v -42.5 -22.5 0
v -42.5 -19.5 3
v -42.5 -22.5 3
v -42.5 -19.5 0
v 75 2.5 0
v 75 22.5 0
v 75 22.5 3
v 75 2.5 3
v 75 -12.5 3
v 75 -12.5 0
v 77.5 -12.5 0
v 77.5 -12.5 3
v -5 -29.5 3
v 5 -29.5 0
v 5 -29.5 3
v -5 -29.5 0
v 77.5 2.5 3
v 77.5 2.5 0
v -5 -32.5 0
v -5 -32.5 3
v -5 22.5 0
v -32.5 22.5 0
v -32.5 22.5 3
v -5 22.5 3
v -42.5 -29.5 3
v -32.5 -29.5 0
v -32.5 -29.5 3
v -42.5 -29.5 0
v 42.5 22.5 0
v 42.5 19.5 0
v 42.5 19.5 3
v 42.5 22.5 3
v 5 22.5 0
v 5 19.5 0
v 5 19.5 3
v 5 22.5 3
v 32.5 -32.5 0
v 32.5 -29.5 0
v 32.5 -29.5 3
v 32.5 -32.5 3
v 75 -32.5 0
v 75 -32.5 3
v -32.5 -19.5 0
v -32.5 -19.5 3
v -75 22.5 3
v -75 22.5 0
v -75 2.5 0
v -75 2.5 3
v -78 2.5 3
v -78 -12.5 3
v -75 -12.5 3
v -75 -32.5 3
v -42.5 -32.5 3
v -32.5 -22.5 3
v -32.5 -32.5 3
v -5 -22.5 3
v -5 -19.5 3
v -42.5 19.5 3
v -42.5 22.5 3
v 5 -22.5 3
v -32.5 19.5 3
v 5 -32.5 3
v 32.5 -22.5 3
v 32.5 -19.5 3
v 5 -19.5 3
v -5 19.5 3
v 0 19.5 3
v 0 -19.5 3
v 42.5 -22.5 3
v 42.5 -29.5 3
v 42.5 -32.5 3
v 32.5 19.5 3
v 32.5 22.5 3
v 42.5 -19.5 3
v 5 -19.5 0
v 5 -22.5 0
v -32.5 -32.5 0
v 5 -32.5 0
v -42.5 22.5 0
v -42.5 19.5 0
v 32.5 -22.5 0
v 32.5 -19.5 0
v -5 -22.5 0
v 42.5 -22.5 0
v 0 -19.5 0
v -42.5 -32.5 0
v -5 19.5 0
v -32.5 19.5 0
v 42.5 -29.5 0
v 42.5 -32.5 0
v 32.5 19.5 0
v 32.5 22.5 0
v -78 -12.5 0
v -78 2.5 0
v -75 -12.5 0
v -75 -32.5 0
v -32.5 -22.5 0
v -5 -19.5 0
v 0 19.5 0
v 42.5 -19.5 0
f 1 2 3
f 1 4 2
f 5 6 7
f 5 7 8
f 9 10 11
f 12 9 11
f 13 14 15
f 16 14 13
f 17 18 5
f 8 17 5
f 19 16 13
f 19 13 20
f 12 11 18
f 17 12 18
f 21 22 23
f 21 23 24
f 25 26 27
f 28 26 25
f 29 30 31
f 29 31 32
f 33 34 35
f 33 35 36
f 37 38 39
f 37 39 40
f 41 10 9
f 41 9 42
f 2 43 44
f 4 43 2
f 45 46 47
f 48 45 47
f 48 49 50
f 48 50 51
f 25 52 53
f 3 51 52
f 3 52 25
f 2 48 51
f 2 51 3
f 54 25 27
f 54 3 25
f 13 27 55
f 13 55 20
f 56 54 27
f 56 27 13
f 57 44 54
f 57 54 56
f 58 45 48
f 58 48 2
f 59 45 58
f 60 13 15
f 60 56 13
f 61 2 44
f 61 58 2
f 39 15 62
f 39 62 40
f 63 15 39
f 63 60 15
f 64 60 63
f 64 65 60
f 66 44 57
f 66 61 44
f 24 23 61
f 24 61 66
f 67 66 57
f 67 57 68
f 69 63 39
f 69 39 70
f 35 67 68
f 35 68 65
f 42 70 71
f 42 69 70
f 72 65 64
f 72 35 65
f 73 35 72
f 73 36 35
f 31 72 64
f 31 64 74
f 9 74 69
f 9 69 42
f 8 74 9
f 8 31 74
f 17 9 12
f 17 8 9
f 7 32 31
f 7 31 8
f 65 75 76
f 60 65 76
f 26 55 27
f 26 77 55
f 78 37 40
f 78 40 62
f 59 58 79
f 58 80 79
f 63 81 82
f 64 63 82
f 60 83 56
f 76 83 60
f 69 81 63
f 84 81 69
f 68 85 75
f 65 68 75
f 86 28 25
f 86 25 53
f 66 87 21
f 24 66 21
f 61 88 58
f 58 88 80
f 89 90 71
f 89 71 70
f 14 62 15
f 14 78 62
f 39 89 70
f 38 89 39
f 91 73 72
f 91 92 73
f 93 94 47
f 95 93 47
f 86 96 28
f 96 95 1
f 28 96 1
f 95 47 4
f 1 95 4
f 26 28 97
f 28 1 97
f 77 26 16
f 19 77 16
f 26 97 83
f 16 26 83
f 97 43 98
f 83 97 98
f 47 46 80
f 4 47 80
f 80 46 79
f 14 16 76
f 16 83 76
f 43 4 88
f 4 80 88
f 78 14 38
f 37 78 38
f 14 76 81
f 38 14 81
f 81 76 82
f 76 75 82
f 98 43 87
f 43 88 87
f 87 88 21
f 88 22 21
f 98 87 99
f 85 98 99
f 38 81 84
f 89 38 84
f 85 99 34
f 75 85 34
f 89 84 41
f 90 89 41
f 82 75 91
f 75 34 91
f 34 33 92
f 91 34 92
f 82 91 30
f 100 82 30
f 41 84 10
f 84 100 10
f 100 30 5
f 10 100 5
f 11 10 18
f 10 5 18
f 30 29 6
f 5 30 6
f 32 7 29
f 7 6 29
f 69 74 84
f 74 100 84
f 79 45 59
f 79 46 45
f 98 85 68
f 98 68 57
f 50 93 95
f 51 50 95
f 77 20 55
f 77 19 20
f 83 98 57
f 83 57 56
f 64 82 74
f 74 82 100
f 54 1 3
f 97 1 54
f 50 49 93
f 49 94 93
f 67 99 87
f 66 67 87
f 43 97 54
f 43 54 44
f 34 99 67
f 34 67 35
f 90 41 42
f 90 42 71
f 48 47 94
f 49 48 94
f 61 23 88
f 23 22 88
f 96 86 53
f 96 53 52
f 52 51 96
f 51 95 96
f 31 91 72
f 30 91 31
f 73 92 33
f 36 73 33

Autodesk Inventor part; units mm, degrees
ref_plane "YZ Plane" through (0, 0, 0) normal (1, 0, 0) x (0, 1, 0)
ref_plane "XZ Plane" through (0, 0, 0) normal (0, 1, 0) x (-1, 0, 0)
ref_plane "XY Plane" through (0, 0, 0) normal (0, 0, 1) x (1, 0, 0)
sketch "Эскиз1" plane through (0, 0, 0) normal (0, 0, 1) x (1, 0, 0)
  line L0 (-32.5, -22.5) -> (-32.5, -19.5)
  line L1 (-32.5, -19.5) -> (-42.5, -19.5)
  line L2 (-42.5, -19.5) -> (-42.5, -22.5)
  line L3 (0, -19.5) -> (-5, -19.5)
  line L4 (-5, -19.5) -> (-5, -22.5)
  line L5 (-75, 22.5) -> (-42.5, 22.5)
  line L6 (-32.5, 22.5) -> (-32.5, 19.5)
  line L7 (-32.5, 19.5) -> (-42.5, 19.5)
  line L8 (-42.5, 19.5) -> (-42.5, 22.5)
  line L9 (-32.5, 22.5) -> (-5, 22.5)
  line L10 (0, 19.5) -> (-5, 19.5)
  line L11 (-5, 19.5) -> (-5, 22.5)
  line L12 (-5, 22.5) -> (-32.5, 22.5)
  line L13 (-42.5, 22.5) -> (-75, 22.5)
  line L14 (32.5, -22.5) -> (32.5, -19.5)
  line L15 (32.5, -19.5) -> (42.5, -19.5)
  line L16 (42.5, -19.5) -> (42.5, -22.5)
  line L17 (0, -19.5) -> (5, -19.5)
  line L18 (5, -19.5) -> (5, -22.5)
  line L19 (75, 22.5) -> (42.5, 22.5)
  line L20 (32.5, 22.5) -> (32.5, 19.5)
  line L21 (32.5, 19.5) -> (42.5, 19.5)
  line L22 (42.5, 19.5) -> (42.5, 22.5)
  line L23 (32.5, 22.5) -> (5, 22.5)
  line L24 (0, 19.5) -> (5, 19.5)
  line L25 (5, 19.5) -> (5, 22.5)
  line L26 (5, 22.5) -> (32.5, 22.5)
  line L27 (42.5, 22.5) -> (75, 22.5)
  line L28 (-42.5, -22.5) -> (-32.5, -22.5)
  line L29 (-5, -22.5) -> (5, -22.5)
  line L30 (32.5, -22.5) -> (42.5, -22.5)
  line L31 (-32.5, -32.5) -> (-32.5, -29.5)
  line L32 (-32.5, -29.5) -> (-42.5, -29.5)
  line L33 (-42.5, -29.5) -> (-42.5, -32.5)
  line L34 (5, -32.5) -> (5, -29.5)
  line L35 (5, -29.5) -> (-5, -29.5)
  line L36 (-5, -29.5) -> (-5, -32.5)
  line L37 (42.5, -32.5) -> (42.5, -29.5)
  line L38 (42.5, -29.5) -> (32.5, -29.5)
  line L39 (32.5, -29.5) -> (32.5, -32.5)
  line L40 (-75, 2.5) -> (-78, 2.5)
  line L41 (-78, 2.5) -> (-78, -12.5)
  line L42 (-78, -12.5) -> (-75, -12.5)
  line L43 (77.5, 2.5) -> (75, 2.5)
  line L44 (75, -12.5) -> (77.5, -12.5)
  line L45 (77.5, -12.5) -> (77.5, 2.5)
  line L46 (75, -32.5) -> (42.5, -32.5)
  line L47 (32.5, -32.5) -> (5, -32.5)
  line L48 (-5, -32.5) -> (-32.5, -32.5)
  line L49 (-42.5, -32.5) -> (-75, -32.5)
  line L50 (-75, 22.5) -> (-75, 2.5)
  line L51 (-75, -12.5) -> (-75, -32.5)
  line L52 (75, 22.5) -> (75, 2.5)
  line L53 (75, -12.5) -> (75, -32.5)
  point P0 (0, 0)
extrude "Выдавливание2" add sketch "Эскиз1" along normal blind 3
sketch "Эскиз2" plane through (0, 0, 3) normal (0, 0, 1) x (1, 0, 0)
  point P0 (0, 0)
properties part number "Стенка t1"
